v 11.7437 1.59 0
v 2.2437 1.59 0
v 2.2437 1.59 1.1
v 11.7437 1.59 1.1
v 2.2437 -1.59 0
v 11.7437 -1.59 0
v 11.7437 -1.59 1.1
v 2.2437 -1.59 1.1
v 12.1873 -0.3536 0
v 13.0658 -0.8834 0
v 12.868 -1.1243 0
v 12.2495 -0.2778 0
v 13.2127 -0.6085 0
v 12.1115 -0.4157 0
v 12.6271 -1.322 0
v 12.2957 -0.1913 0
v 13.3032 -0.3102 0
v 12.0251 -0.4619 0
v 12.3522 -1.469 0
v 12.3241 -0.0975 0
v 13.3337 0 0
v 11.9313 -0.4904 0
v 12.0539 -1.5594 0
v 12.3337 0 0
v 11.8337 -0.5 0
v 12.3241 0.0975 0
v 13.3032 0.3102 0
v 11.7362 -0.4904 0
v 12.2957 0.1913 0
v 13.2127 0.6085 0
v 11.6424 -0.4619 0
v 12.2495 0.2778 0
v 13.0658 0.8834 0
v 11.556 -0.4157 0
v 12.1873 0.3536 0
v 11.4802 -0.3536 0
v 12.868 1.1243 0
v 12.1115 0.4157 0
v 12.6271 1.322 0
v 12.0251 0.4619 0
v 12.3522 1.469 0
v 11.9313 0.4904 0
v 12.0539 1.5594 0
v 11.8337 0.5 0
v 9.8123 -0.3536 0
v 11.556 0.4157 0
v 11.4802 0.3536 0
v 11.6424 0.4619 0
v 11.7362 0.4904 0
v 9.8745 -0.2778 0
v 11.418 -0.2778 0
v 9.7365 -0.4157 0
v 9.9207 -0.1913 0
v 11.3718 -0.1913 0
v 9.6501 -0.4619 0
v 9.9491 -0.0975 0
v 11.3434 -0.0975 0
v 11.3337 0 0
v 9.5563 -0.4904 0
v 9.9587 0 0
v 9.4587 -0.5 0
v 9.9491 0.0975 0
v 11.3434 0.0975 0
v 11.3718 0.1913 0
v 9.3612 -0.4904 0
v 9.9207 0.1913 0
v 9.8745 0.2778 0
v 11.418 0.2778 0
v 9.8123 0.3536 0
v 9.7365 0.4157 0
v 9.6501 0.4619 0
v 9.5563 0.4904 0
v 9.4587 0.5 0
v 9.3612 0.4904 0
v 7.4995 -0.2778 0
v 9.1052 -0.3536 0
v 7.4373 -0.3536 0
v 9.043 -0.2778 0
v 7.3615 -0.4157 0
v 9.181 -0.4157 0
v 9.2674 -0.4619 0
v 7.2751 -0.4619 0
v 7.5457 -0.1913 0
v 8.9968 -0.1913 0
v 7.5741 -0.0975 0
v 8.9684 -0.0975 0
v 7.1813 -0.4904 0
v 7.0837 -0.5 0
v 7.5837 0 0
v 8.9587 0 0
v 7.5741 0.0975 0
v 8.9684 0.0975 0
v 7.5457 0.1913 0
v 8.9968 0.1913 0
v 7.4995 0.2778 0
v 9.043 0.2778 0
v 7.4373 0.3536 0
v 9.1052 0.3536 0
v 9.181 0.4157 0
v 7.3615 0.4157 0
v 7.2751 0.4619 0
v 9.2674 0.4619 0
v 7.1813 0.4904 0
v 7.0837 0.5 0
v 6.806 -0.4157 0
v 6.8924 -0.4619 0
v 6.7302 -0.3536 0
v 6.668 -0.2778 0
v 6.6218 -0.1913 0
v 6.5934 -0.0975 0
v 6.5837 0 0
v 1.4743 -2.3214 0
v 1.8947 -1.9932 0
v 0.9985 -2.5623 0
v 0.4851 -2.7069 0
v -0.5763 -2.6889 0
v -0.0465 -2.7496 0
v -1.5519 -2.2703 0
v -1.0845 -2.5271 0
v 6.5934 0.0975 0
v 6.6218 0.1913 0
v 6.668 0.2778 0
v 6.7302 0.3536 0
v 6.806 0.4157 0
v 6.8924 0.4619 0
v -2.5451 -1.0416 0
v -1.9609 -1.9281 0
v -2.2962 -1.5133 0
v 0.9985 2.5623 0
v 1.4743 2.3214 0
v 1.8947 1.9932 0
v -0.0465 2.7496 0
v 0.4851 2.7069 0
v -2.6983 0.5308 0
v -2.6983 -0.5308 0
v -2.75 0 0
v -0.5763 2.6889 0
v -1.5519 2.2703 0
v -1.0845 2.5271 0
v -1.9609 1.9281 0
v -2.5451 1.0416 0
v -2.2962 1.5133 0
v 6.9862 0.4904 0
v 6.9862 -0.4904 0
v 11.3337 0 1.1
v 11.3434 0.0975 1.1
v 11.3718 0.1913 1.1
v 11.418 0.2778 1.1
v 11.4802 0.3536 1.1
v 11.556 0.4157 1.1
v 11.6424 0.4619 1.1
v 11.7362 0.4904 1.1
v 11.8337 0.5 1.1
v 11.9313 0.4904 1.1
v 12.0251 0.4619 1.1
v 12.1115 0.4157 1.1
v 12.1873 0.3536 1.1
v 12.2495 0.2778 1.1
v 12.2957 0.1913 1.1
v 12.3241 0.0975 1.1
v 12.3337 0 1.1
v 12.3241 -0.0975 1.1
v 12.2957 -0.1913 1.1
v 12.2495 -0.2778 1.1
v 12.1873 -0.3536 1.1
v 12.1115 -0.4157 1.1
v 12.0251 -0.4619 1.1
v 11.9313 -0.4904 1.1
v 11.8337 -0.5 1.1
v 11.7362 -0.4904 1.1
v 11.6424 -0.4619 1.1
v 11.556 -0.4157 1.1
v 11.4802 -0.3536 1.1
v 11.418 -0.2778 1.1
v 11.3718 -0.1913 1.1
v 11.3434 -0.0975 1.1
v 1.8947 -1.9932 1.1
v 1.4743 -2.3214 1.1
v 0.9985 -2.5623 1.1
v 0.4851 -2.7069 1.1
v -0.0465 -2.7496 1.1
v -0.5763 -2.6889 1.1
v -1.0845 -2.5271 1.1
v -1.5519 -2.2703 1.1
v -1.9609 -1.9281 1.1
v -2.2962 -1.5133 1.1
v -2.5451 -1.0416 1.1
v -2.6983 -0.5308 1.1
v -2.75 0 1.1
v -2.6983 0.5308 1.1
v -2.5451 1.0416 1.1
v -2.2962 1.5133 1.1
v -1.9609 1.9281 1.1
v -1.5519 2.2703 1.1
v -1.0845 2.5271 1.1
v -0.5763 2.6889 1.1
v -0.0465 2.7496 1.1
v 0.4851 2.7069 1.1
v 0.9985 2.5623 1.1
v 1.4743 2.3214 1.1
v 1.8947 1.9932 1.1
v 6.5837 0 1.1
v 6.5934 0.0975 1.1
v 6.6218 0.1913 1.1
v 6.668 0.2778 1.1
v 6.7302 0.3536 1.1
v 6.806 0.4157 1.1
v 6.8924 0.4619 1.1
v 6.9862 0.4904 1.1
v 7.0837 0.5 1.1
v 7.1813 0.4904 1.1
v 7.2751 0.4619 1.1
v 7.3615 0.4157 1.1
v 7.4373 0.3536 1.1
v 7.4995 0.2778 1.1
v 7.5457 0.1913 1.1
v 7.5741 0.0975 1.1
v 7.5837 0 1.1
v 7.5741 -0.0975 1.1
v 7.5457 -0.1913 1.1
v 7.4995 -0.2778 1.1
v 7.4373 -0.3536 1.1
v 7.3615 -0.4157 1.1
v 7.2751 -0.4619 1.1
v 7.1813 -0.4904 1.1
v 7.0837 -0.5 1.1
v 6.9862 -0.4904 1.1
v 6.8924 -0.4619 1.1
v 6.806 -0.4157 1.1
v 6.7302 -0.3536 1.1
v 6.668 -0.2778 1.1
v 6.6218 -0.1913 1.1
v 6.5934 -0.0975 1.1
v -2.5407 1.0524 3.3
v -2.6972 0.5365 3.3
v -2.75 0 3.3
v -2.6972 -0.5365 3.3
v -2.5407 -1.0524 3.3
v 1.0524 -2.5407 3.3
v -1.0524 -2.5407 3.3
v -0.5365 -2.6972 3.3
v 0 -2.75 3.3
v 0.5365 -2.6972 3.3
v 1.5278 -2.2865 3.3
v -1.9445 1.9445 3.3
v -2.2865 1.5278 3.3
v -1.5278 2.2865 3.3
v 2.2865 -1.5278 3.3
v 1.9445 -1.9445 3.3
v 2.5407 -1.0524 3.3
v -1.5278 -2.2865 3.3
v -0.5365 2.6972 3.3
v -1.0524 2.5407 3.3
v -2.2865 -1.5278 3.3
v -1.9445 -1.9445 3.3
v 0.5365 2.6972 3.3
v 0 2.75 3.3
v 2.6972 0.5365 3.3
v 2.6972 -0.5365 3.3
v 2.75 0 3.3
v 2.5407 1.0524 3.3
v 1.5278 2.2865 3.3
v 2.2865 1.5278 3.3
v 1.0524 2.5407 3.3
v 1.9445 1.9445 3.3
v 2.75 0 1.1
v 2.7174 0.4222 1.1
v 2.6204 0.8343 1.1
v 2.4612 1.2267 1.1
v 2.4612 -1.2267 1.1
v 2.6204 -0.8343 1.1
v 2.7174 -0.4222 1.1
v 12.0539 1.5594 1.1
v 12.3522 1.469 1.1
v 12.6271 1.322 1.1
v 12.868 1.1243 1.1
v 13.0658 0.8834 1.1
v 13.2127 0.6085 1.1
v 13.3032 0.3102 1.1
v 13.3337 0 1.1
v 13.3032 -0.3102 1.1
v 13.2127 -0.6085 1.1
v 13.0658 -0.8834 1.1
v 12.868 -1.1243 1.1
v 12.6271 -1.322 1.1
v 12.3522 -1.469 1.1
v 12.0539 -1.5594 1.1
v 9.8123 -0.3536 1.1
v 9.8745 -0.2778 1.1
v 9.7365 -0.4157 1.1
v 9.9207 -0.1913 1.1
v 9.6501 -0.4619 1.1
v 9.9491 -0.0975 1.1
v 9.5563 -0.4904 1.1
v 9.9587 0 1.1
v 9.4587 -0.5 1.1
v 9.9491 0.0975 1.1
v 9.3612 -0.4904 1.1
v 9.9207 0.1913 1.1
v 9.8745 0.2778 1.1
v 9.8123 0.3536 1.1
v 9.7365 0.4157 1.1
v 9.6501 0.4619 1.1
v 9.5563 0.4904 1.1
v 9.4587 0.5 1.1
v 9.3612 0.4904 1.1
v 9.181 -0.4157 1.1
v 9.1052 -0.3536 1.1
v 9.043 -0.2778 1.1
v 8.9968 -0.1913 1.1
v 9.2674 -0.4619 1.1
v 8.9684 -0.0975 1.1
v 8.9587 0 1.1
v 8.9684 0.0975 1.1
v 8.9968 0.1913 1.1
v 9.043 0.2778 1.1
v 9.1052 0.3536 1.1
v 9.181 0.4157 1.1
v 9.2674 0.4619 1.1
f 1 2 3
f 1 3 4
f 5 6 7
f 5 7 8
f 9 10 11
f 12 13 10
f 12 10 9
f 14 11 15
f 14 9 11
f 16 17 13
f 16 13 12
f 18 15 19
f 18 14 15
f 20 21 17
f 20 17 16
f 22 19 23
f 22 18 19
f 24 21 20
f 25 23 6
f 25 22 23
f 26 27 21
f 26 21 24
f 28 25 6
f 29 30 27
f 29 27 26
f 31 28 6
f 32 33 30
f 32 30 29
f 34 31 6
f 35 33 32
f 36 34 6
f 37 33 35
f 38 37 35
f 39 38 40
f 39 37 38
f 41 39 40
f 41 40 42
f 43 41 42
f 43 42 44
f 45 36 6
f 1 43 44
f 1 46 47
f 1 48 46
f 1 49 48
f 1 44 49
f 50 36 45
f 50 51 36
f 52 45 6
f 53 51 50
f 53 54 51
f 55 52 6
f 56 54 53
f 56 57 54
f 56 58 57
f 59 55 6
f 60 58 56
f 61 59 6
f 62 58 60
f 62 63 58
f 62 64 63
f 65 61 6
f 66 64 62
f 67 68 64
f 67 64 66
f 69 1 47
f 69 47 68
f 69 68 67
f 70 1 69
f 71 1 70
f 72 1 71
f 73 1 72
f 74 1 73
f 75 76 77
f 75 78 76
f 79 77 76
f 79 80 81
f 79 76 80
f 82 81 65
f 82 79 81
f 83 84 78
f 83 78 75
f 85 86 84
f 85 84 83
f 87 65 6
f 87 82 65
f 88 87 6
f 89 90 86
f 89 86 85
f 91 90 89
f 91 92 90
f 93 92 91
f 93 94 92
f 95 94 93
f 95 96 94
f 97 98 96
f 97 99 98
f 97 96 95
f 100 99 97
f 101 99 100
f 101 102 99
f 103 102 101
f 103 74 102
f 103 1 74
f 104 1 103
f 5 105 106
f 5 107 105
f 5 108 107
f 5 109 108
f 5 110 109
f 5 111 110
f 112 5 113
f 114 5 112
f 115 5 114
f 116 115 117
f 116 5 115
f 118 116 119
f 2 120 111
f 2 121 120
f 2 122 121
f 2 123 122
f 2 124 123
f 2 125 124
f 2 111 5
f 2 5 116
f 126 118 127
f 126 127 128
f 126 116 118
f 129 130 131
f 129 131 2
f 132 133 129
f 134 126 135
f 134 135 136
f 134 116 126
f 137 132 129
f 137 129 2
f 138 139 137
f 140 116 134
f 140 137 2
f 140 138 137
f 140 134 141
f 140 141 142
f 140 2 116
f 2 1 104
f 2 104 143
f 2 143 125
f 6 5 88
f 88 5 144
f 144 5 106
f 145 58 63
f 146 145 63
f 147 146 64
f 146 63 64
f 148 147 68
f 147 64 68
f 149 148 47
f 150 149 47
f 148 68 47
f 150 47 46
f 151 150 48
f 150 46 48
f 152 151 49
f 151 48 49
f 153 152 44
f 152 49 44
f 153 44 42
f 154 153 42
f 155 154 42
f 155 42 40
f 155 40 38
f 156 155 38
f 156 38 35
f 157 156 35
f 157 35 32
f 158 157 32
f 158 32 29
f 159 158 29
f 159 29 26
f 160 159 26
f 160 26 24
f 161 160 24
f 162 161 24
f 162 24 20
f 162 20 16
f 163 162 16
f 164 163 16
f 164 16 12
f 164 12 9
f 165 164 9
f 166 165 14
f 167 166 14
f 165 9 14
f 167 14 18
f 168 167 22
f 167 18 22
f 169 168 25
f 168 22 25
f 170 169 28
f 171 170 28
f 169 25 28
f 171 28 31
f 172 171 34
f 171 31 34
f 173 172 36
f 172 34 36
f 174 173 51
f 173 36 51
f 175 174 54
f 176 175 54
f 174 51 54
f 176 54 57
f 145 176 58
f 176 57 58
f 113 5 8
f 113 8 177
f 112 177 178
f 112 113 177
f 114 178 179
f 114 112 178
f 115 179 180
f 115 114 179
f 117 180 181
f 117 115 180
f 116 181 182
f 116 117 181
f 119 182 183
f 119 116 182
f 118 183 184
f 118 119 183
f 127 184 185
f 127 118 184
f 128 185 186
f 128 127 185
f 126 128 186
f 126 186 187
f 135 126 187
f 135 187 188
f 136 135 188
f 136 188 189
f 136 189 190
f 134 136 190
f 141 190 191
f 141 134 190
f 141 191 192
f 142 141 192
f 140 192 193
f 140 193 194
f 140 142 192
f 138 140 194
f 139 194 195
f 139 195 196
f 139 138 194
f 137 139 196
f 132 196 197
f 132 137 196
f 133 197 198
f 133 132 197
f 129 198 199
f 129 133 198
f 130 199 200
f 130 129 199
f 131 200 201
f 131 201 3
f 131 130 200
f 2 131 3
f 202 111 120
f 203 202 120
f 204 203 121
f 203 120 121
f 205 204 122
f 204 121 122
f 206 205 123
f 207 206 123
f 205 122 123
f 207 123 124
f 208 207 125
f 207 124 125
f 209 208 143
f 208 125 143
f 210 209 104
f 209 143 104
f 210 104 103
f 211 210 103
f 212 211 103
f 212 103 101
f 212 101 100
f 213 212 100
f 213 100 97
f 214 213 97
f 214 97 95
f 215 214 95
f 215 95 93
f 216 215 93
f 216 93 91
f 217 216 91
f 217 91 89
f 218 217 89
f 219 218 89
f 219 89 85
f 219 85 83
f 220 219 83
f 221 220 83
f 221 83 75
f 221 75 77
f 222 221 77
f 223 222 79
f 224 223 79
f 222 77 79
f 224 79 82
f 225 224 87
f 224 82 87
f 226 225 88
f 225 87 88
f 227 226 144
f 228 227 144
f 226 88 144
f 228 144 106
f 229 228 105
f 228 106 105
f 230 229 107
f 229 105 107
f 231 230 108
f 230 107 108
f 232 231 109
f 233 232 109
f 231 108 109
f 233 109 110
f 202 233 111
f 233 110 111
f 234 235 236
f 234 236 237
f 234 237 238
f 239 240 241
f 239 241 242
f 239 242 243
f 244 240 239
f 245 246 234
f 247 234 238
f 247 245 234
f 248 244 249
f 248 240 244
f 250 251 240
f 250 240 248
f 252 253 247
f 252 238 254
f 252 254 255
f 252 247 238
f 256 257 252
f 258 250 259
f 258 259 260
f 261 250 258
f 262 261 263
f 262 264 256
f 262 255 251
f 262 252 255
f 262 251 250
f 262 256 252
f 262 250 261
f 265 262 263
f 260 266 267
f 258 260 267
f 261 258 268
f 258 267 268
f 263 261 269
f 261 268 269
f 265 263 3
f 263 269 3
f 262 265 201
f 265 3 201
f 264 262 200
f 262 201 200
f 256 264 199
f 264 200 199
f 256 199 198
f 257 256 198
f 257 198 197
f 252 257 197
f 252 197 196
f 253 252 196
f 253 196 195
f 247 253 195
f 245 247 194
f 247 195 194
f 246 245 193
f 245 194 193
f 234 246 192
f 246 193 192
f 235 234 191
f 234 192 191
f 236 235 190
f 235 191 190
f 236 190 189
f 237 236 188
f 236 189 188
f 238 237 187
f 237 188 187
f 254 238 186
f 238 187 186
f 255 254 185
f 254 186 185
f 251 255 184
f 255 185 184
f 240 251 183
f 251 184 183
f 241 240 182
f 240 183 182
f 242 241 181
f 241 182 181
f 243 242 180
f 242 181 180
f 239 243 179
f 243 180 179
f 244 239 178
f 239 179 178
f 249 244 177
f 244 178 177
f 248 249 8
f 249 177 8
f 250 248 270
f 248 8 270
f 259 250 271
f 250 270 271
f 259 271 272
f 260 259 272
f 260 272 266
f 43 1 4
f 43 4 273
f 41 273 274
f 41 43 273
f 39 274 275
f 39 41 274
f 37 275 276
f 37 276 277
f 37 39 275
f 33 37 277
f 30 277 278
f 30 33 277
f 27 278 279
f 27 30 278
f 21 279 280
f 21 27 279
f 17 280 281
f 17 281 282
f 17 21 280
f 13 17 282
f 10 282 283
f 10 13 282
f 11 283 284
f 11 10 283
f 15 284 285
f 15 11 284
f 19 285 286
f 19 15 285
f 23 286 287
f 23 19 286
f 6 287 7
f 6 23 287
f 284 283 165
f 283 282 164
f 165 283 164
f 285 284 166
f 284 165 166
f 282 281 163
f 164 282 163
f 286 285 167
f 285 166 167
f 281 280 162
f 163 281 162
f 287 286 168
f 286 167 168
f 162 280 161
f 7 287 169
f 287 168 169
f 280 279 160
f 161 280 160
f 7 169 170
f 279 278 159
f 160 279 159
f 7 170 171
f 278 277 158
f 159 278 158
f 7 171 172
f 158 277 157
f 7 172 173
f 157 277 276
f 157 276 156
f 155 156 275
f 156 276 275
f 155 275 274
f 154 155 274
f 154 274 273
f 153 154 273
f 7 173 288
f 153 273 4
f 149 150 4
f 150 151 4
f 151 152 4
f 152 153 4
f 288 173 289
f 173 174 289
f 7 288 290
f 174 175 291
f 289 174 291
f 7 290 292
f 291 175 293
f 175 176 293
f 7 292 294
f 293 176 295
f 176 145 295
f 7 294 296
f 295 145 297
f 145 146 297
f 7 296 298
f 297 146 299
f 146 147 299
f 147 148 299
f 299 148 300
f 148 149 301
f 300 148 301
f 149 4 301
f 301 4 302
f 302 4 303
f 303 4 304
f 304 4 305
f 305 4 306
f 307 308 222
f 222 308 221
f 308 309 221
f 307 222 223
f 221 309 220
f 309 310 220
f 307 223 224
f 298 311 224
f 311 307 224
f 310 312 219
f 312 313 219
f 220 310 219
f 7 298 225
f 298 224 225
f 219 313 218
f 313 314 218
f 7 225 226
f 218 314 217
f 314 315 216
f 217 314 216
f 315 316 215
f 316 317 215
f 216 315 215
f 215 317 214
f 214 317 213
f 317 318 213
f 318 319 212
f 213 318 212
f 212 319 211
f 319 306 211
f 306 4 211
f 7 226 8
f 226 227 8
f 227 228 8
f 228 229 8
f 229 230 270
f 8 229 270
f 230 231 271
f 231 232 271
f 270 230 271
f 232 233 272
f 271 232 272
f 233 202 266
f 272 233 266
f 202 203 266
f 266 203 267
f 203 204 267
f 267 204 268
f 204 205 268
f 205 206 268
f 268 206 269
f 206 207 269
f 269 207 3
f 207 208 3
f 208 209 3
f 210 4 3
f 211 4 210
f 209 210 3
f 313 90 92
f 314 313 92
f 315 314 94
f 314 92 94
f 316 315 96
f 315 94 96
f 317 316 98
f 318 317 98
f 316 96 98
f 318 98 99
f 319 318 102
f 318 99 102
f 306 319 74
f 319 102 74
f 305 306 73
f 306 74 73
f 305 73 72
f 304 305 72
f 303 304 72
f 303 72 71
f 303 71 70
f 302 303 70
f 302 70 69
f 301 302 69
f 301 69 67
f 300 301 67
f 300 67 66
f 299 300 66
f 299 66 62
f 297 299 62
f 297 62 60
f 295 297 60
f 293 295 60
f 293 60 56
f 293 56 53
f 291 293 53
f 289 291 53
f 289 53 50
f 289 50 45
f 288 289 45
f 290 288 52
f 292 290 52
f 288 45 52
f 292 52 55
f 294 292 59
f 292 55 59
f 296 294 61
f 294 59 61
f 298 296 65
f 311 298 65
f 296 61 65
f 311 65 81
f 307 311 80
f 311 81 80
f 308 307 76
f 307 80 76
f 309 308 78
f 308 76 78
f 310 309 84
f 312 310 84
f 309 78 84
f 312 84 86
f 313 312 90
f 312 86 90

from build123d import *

# Parameters (mm, degrees)
BOSS_EXTRUDE1_DEPTH = 1.1
SKETCH2_R           = 2.75
BOSS_EXTRUDE2_DEPTH = 2.2
CUT_EXTRUDE1_REACH  = 5.3
SKETCH3_R           = 0.5


with BuildPart() as part:
    # Sketch1 → Boss-Extrude1 (new body)
    with BuildSketch(Plane.XY):
        with BuildLine():
            Line((2.243746866, 1.59), (11.743746866, 1.59))
            ThreePointArc((11.743746866, 1.59), (13.333746866, 0), (11.743746866, -1.59))
            Line((11.743746866, -1.59), (2.243746866, -1.59))
            ThreePointArc((2.243746866, -1.59), (-2.75, 0), (2.243746866, 1.59))
        make_face()
    extrude(amount=BOSS_EXTRUDE1_DEPTH)

    # Sketch2 → Boss-Extrude2 (add)
    with BuildSketch(Plane.XY.offset(1.1)):
        Circle(SKETCH2_R)
    extrude(amount=BOSS_EXTRUDE2_DEPTH)

    # Sketch3 → Cut-Extrude1 (cut, up to next)
    with BuildSketch(Plane(origin=(0, 0, 0), x_dir=(-1, 0, 0), z_dir=(0, 0, -1)), mode=Mode.PRIVATE) as cut_extrude1_sk1:
        with Locations((-11.833746866, 0)):
            Circle(SKETCH3_R)
    cut_extrude1_tool1 = extrude(cut_extrude1_sk1.sketch, amount=-CUT_EXTRUDE1_REACH, mode=Mode.PRIVATE) & part.part
    add(cut_extrude1_tool1.solids().sort_by_distance((11.833747, 0, 0))[0], mode=Mode.SUBTRACT)
    # Sketch3 → Cut-Extrude1 (cut, up to next)
    with BuildSketch(Plane(origin=(0, 0, 0), x_dir=(-1, 0, 0), z_dir=(0, 0, -1)), mode=Mode.PRIVATE) as cut_extrude1_sk2:
        with Locations((-9.458746866, 0)):
            Circle(SKETCH3_R)
    cut_extrude1_tool2 = extrude(cut_extrude1_sk2.sketch, amount=-CUT_EXTRUDE1_REACH, mode=Mode.PRIVATE) & part.part
    add(cut_extrude1_tool2.solids().sort_by_distance((9.458747, 0, 0))[0], mode=Mode.SUBTRACT)
    # Sketch3 → Cut-Extrude1 (cut, up to next)
    with BuildSketch(Plane(origin=(0, 0, 0), x_dir=(-1, 0, 0), z_dir=(0, 0, -1)), mode=Mode.PRIVATE) as cut_extrude1_sk3:
        with Locations((-7.083746866, 0)):
            Circle(SKETCH3_R)
    cut_extrude1_tool3 = extrude(cut_extrude1_sk3.sketch, amount=-CUT_EXTRUDE1_REACH, mode=Mode.PRIVATE) & part.part
    add(cut_extrude1_tool3.solids().sort_by_distance((7.083747, 0, 0))[0], mode=Mode.SUBTRACT)


solid = part.part
